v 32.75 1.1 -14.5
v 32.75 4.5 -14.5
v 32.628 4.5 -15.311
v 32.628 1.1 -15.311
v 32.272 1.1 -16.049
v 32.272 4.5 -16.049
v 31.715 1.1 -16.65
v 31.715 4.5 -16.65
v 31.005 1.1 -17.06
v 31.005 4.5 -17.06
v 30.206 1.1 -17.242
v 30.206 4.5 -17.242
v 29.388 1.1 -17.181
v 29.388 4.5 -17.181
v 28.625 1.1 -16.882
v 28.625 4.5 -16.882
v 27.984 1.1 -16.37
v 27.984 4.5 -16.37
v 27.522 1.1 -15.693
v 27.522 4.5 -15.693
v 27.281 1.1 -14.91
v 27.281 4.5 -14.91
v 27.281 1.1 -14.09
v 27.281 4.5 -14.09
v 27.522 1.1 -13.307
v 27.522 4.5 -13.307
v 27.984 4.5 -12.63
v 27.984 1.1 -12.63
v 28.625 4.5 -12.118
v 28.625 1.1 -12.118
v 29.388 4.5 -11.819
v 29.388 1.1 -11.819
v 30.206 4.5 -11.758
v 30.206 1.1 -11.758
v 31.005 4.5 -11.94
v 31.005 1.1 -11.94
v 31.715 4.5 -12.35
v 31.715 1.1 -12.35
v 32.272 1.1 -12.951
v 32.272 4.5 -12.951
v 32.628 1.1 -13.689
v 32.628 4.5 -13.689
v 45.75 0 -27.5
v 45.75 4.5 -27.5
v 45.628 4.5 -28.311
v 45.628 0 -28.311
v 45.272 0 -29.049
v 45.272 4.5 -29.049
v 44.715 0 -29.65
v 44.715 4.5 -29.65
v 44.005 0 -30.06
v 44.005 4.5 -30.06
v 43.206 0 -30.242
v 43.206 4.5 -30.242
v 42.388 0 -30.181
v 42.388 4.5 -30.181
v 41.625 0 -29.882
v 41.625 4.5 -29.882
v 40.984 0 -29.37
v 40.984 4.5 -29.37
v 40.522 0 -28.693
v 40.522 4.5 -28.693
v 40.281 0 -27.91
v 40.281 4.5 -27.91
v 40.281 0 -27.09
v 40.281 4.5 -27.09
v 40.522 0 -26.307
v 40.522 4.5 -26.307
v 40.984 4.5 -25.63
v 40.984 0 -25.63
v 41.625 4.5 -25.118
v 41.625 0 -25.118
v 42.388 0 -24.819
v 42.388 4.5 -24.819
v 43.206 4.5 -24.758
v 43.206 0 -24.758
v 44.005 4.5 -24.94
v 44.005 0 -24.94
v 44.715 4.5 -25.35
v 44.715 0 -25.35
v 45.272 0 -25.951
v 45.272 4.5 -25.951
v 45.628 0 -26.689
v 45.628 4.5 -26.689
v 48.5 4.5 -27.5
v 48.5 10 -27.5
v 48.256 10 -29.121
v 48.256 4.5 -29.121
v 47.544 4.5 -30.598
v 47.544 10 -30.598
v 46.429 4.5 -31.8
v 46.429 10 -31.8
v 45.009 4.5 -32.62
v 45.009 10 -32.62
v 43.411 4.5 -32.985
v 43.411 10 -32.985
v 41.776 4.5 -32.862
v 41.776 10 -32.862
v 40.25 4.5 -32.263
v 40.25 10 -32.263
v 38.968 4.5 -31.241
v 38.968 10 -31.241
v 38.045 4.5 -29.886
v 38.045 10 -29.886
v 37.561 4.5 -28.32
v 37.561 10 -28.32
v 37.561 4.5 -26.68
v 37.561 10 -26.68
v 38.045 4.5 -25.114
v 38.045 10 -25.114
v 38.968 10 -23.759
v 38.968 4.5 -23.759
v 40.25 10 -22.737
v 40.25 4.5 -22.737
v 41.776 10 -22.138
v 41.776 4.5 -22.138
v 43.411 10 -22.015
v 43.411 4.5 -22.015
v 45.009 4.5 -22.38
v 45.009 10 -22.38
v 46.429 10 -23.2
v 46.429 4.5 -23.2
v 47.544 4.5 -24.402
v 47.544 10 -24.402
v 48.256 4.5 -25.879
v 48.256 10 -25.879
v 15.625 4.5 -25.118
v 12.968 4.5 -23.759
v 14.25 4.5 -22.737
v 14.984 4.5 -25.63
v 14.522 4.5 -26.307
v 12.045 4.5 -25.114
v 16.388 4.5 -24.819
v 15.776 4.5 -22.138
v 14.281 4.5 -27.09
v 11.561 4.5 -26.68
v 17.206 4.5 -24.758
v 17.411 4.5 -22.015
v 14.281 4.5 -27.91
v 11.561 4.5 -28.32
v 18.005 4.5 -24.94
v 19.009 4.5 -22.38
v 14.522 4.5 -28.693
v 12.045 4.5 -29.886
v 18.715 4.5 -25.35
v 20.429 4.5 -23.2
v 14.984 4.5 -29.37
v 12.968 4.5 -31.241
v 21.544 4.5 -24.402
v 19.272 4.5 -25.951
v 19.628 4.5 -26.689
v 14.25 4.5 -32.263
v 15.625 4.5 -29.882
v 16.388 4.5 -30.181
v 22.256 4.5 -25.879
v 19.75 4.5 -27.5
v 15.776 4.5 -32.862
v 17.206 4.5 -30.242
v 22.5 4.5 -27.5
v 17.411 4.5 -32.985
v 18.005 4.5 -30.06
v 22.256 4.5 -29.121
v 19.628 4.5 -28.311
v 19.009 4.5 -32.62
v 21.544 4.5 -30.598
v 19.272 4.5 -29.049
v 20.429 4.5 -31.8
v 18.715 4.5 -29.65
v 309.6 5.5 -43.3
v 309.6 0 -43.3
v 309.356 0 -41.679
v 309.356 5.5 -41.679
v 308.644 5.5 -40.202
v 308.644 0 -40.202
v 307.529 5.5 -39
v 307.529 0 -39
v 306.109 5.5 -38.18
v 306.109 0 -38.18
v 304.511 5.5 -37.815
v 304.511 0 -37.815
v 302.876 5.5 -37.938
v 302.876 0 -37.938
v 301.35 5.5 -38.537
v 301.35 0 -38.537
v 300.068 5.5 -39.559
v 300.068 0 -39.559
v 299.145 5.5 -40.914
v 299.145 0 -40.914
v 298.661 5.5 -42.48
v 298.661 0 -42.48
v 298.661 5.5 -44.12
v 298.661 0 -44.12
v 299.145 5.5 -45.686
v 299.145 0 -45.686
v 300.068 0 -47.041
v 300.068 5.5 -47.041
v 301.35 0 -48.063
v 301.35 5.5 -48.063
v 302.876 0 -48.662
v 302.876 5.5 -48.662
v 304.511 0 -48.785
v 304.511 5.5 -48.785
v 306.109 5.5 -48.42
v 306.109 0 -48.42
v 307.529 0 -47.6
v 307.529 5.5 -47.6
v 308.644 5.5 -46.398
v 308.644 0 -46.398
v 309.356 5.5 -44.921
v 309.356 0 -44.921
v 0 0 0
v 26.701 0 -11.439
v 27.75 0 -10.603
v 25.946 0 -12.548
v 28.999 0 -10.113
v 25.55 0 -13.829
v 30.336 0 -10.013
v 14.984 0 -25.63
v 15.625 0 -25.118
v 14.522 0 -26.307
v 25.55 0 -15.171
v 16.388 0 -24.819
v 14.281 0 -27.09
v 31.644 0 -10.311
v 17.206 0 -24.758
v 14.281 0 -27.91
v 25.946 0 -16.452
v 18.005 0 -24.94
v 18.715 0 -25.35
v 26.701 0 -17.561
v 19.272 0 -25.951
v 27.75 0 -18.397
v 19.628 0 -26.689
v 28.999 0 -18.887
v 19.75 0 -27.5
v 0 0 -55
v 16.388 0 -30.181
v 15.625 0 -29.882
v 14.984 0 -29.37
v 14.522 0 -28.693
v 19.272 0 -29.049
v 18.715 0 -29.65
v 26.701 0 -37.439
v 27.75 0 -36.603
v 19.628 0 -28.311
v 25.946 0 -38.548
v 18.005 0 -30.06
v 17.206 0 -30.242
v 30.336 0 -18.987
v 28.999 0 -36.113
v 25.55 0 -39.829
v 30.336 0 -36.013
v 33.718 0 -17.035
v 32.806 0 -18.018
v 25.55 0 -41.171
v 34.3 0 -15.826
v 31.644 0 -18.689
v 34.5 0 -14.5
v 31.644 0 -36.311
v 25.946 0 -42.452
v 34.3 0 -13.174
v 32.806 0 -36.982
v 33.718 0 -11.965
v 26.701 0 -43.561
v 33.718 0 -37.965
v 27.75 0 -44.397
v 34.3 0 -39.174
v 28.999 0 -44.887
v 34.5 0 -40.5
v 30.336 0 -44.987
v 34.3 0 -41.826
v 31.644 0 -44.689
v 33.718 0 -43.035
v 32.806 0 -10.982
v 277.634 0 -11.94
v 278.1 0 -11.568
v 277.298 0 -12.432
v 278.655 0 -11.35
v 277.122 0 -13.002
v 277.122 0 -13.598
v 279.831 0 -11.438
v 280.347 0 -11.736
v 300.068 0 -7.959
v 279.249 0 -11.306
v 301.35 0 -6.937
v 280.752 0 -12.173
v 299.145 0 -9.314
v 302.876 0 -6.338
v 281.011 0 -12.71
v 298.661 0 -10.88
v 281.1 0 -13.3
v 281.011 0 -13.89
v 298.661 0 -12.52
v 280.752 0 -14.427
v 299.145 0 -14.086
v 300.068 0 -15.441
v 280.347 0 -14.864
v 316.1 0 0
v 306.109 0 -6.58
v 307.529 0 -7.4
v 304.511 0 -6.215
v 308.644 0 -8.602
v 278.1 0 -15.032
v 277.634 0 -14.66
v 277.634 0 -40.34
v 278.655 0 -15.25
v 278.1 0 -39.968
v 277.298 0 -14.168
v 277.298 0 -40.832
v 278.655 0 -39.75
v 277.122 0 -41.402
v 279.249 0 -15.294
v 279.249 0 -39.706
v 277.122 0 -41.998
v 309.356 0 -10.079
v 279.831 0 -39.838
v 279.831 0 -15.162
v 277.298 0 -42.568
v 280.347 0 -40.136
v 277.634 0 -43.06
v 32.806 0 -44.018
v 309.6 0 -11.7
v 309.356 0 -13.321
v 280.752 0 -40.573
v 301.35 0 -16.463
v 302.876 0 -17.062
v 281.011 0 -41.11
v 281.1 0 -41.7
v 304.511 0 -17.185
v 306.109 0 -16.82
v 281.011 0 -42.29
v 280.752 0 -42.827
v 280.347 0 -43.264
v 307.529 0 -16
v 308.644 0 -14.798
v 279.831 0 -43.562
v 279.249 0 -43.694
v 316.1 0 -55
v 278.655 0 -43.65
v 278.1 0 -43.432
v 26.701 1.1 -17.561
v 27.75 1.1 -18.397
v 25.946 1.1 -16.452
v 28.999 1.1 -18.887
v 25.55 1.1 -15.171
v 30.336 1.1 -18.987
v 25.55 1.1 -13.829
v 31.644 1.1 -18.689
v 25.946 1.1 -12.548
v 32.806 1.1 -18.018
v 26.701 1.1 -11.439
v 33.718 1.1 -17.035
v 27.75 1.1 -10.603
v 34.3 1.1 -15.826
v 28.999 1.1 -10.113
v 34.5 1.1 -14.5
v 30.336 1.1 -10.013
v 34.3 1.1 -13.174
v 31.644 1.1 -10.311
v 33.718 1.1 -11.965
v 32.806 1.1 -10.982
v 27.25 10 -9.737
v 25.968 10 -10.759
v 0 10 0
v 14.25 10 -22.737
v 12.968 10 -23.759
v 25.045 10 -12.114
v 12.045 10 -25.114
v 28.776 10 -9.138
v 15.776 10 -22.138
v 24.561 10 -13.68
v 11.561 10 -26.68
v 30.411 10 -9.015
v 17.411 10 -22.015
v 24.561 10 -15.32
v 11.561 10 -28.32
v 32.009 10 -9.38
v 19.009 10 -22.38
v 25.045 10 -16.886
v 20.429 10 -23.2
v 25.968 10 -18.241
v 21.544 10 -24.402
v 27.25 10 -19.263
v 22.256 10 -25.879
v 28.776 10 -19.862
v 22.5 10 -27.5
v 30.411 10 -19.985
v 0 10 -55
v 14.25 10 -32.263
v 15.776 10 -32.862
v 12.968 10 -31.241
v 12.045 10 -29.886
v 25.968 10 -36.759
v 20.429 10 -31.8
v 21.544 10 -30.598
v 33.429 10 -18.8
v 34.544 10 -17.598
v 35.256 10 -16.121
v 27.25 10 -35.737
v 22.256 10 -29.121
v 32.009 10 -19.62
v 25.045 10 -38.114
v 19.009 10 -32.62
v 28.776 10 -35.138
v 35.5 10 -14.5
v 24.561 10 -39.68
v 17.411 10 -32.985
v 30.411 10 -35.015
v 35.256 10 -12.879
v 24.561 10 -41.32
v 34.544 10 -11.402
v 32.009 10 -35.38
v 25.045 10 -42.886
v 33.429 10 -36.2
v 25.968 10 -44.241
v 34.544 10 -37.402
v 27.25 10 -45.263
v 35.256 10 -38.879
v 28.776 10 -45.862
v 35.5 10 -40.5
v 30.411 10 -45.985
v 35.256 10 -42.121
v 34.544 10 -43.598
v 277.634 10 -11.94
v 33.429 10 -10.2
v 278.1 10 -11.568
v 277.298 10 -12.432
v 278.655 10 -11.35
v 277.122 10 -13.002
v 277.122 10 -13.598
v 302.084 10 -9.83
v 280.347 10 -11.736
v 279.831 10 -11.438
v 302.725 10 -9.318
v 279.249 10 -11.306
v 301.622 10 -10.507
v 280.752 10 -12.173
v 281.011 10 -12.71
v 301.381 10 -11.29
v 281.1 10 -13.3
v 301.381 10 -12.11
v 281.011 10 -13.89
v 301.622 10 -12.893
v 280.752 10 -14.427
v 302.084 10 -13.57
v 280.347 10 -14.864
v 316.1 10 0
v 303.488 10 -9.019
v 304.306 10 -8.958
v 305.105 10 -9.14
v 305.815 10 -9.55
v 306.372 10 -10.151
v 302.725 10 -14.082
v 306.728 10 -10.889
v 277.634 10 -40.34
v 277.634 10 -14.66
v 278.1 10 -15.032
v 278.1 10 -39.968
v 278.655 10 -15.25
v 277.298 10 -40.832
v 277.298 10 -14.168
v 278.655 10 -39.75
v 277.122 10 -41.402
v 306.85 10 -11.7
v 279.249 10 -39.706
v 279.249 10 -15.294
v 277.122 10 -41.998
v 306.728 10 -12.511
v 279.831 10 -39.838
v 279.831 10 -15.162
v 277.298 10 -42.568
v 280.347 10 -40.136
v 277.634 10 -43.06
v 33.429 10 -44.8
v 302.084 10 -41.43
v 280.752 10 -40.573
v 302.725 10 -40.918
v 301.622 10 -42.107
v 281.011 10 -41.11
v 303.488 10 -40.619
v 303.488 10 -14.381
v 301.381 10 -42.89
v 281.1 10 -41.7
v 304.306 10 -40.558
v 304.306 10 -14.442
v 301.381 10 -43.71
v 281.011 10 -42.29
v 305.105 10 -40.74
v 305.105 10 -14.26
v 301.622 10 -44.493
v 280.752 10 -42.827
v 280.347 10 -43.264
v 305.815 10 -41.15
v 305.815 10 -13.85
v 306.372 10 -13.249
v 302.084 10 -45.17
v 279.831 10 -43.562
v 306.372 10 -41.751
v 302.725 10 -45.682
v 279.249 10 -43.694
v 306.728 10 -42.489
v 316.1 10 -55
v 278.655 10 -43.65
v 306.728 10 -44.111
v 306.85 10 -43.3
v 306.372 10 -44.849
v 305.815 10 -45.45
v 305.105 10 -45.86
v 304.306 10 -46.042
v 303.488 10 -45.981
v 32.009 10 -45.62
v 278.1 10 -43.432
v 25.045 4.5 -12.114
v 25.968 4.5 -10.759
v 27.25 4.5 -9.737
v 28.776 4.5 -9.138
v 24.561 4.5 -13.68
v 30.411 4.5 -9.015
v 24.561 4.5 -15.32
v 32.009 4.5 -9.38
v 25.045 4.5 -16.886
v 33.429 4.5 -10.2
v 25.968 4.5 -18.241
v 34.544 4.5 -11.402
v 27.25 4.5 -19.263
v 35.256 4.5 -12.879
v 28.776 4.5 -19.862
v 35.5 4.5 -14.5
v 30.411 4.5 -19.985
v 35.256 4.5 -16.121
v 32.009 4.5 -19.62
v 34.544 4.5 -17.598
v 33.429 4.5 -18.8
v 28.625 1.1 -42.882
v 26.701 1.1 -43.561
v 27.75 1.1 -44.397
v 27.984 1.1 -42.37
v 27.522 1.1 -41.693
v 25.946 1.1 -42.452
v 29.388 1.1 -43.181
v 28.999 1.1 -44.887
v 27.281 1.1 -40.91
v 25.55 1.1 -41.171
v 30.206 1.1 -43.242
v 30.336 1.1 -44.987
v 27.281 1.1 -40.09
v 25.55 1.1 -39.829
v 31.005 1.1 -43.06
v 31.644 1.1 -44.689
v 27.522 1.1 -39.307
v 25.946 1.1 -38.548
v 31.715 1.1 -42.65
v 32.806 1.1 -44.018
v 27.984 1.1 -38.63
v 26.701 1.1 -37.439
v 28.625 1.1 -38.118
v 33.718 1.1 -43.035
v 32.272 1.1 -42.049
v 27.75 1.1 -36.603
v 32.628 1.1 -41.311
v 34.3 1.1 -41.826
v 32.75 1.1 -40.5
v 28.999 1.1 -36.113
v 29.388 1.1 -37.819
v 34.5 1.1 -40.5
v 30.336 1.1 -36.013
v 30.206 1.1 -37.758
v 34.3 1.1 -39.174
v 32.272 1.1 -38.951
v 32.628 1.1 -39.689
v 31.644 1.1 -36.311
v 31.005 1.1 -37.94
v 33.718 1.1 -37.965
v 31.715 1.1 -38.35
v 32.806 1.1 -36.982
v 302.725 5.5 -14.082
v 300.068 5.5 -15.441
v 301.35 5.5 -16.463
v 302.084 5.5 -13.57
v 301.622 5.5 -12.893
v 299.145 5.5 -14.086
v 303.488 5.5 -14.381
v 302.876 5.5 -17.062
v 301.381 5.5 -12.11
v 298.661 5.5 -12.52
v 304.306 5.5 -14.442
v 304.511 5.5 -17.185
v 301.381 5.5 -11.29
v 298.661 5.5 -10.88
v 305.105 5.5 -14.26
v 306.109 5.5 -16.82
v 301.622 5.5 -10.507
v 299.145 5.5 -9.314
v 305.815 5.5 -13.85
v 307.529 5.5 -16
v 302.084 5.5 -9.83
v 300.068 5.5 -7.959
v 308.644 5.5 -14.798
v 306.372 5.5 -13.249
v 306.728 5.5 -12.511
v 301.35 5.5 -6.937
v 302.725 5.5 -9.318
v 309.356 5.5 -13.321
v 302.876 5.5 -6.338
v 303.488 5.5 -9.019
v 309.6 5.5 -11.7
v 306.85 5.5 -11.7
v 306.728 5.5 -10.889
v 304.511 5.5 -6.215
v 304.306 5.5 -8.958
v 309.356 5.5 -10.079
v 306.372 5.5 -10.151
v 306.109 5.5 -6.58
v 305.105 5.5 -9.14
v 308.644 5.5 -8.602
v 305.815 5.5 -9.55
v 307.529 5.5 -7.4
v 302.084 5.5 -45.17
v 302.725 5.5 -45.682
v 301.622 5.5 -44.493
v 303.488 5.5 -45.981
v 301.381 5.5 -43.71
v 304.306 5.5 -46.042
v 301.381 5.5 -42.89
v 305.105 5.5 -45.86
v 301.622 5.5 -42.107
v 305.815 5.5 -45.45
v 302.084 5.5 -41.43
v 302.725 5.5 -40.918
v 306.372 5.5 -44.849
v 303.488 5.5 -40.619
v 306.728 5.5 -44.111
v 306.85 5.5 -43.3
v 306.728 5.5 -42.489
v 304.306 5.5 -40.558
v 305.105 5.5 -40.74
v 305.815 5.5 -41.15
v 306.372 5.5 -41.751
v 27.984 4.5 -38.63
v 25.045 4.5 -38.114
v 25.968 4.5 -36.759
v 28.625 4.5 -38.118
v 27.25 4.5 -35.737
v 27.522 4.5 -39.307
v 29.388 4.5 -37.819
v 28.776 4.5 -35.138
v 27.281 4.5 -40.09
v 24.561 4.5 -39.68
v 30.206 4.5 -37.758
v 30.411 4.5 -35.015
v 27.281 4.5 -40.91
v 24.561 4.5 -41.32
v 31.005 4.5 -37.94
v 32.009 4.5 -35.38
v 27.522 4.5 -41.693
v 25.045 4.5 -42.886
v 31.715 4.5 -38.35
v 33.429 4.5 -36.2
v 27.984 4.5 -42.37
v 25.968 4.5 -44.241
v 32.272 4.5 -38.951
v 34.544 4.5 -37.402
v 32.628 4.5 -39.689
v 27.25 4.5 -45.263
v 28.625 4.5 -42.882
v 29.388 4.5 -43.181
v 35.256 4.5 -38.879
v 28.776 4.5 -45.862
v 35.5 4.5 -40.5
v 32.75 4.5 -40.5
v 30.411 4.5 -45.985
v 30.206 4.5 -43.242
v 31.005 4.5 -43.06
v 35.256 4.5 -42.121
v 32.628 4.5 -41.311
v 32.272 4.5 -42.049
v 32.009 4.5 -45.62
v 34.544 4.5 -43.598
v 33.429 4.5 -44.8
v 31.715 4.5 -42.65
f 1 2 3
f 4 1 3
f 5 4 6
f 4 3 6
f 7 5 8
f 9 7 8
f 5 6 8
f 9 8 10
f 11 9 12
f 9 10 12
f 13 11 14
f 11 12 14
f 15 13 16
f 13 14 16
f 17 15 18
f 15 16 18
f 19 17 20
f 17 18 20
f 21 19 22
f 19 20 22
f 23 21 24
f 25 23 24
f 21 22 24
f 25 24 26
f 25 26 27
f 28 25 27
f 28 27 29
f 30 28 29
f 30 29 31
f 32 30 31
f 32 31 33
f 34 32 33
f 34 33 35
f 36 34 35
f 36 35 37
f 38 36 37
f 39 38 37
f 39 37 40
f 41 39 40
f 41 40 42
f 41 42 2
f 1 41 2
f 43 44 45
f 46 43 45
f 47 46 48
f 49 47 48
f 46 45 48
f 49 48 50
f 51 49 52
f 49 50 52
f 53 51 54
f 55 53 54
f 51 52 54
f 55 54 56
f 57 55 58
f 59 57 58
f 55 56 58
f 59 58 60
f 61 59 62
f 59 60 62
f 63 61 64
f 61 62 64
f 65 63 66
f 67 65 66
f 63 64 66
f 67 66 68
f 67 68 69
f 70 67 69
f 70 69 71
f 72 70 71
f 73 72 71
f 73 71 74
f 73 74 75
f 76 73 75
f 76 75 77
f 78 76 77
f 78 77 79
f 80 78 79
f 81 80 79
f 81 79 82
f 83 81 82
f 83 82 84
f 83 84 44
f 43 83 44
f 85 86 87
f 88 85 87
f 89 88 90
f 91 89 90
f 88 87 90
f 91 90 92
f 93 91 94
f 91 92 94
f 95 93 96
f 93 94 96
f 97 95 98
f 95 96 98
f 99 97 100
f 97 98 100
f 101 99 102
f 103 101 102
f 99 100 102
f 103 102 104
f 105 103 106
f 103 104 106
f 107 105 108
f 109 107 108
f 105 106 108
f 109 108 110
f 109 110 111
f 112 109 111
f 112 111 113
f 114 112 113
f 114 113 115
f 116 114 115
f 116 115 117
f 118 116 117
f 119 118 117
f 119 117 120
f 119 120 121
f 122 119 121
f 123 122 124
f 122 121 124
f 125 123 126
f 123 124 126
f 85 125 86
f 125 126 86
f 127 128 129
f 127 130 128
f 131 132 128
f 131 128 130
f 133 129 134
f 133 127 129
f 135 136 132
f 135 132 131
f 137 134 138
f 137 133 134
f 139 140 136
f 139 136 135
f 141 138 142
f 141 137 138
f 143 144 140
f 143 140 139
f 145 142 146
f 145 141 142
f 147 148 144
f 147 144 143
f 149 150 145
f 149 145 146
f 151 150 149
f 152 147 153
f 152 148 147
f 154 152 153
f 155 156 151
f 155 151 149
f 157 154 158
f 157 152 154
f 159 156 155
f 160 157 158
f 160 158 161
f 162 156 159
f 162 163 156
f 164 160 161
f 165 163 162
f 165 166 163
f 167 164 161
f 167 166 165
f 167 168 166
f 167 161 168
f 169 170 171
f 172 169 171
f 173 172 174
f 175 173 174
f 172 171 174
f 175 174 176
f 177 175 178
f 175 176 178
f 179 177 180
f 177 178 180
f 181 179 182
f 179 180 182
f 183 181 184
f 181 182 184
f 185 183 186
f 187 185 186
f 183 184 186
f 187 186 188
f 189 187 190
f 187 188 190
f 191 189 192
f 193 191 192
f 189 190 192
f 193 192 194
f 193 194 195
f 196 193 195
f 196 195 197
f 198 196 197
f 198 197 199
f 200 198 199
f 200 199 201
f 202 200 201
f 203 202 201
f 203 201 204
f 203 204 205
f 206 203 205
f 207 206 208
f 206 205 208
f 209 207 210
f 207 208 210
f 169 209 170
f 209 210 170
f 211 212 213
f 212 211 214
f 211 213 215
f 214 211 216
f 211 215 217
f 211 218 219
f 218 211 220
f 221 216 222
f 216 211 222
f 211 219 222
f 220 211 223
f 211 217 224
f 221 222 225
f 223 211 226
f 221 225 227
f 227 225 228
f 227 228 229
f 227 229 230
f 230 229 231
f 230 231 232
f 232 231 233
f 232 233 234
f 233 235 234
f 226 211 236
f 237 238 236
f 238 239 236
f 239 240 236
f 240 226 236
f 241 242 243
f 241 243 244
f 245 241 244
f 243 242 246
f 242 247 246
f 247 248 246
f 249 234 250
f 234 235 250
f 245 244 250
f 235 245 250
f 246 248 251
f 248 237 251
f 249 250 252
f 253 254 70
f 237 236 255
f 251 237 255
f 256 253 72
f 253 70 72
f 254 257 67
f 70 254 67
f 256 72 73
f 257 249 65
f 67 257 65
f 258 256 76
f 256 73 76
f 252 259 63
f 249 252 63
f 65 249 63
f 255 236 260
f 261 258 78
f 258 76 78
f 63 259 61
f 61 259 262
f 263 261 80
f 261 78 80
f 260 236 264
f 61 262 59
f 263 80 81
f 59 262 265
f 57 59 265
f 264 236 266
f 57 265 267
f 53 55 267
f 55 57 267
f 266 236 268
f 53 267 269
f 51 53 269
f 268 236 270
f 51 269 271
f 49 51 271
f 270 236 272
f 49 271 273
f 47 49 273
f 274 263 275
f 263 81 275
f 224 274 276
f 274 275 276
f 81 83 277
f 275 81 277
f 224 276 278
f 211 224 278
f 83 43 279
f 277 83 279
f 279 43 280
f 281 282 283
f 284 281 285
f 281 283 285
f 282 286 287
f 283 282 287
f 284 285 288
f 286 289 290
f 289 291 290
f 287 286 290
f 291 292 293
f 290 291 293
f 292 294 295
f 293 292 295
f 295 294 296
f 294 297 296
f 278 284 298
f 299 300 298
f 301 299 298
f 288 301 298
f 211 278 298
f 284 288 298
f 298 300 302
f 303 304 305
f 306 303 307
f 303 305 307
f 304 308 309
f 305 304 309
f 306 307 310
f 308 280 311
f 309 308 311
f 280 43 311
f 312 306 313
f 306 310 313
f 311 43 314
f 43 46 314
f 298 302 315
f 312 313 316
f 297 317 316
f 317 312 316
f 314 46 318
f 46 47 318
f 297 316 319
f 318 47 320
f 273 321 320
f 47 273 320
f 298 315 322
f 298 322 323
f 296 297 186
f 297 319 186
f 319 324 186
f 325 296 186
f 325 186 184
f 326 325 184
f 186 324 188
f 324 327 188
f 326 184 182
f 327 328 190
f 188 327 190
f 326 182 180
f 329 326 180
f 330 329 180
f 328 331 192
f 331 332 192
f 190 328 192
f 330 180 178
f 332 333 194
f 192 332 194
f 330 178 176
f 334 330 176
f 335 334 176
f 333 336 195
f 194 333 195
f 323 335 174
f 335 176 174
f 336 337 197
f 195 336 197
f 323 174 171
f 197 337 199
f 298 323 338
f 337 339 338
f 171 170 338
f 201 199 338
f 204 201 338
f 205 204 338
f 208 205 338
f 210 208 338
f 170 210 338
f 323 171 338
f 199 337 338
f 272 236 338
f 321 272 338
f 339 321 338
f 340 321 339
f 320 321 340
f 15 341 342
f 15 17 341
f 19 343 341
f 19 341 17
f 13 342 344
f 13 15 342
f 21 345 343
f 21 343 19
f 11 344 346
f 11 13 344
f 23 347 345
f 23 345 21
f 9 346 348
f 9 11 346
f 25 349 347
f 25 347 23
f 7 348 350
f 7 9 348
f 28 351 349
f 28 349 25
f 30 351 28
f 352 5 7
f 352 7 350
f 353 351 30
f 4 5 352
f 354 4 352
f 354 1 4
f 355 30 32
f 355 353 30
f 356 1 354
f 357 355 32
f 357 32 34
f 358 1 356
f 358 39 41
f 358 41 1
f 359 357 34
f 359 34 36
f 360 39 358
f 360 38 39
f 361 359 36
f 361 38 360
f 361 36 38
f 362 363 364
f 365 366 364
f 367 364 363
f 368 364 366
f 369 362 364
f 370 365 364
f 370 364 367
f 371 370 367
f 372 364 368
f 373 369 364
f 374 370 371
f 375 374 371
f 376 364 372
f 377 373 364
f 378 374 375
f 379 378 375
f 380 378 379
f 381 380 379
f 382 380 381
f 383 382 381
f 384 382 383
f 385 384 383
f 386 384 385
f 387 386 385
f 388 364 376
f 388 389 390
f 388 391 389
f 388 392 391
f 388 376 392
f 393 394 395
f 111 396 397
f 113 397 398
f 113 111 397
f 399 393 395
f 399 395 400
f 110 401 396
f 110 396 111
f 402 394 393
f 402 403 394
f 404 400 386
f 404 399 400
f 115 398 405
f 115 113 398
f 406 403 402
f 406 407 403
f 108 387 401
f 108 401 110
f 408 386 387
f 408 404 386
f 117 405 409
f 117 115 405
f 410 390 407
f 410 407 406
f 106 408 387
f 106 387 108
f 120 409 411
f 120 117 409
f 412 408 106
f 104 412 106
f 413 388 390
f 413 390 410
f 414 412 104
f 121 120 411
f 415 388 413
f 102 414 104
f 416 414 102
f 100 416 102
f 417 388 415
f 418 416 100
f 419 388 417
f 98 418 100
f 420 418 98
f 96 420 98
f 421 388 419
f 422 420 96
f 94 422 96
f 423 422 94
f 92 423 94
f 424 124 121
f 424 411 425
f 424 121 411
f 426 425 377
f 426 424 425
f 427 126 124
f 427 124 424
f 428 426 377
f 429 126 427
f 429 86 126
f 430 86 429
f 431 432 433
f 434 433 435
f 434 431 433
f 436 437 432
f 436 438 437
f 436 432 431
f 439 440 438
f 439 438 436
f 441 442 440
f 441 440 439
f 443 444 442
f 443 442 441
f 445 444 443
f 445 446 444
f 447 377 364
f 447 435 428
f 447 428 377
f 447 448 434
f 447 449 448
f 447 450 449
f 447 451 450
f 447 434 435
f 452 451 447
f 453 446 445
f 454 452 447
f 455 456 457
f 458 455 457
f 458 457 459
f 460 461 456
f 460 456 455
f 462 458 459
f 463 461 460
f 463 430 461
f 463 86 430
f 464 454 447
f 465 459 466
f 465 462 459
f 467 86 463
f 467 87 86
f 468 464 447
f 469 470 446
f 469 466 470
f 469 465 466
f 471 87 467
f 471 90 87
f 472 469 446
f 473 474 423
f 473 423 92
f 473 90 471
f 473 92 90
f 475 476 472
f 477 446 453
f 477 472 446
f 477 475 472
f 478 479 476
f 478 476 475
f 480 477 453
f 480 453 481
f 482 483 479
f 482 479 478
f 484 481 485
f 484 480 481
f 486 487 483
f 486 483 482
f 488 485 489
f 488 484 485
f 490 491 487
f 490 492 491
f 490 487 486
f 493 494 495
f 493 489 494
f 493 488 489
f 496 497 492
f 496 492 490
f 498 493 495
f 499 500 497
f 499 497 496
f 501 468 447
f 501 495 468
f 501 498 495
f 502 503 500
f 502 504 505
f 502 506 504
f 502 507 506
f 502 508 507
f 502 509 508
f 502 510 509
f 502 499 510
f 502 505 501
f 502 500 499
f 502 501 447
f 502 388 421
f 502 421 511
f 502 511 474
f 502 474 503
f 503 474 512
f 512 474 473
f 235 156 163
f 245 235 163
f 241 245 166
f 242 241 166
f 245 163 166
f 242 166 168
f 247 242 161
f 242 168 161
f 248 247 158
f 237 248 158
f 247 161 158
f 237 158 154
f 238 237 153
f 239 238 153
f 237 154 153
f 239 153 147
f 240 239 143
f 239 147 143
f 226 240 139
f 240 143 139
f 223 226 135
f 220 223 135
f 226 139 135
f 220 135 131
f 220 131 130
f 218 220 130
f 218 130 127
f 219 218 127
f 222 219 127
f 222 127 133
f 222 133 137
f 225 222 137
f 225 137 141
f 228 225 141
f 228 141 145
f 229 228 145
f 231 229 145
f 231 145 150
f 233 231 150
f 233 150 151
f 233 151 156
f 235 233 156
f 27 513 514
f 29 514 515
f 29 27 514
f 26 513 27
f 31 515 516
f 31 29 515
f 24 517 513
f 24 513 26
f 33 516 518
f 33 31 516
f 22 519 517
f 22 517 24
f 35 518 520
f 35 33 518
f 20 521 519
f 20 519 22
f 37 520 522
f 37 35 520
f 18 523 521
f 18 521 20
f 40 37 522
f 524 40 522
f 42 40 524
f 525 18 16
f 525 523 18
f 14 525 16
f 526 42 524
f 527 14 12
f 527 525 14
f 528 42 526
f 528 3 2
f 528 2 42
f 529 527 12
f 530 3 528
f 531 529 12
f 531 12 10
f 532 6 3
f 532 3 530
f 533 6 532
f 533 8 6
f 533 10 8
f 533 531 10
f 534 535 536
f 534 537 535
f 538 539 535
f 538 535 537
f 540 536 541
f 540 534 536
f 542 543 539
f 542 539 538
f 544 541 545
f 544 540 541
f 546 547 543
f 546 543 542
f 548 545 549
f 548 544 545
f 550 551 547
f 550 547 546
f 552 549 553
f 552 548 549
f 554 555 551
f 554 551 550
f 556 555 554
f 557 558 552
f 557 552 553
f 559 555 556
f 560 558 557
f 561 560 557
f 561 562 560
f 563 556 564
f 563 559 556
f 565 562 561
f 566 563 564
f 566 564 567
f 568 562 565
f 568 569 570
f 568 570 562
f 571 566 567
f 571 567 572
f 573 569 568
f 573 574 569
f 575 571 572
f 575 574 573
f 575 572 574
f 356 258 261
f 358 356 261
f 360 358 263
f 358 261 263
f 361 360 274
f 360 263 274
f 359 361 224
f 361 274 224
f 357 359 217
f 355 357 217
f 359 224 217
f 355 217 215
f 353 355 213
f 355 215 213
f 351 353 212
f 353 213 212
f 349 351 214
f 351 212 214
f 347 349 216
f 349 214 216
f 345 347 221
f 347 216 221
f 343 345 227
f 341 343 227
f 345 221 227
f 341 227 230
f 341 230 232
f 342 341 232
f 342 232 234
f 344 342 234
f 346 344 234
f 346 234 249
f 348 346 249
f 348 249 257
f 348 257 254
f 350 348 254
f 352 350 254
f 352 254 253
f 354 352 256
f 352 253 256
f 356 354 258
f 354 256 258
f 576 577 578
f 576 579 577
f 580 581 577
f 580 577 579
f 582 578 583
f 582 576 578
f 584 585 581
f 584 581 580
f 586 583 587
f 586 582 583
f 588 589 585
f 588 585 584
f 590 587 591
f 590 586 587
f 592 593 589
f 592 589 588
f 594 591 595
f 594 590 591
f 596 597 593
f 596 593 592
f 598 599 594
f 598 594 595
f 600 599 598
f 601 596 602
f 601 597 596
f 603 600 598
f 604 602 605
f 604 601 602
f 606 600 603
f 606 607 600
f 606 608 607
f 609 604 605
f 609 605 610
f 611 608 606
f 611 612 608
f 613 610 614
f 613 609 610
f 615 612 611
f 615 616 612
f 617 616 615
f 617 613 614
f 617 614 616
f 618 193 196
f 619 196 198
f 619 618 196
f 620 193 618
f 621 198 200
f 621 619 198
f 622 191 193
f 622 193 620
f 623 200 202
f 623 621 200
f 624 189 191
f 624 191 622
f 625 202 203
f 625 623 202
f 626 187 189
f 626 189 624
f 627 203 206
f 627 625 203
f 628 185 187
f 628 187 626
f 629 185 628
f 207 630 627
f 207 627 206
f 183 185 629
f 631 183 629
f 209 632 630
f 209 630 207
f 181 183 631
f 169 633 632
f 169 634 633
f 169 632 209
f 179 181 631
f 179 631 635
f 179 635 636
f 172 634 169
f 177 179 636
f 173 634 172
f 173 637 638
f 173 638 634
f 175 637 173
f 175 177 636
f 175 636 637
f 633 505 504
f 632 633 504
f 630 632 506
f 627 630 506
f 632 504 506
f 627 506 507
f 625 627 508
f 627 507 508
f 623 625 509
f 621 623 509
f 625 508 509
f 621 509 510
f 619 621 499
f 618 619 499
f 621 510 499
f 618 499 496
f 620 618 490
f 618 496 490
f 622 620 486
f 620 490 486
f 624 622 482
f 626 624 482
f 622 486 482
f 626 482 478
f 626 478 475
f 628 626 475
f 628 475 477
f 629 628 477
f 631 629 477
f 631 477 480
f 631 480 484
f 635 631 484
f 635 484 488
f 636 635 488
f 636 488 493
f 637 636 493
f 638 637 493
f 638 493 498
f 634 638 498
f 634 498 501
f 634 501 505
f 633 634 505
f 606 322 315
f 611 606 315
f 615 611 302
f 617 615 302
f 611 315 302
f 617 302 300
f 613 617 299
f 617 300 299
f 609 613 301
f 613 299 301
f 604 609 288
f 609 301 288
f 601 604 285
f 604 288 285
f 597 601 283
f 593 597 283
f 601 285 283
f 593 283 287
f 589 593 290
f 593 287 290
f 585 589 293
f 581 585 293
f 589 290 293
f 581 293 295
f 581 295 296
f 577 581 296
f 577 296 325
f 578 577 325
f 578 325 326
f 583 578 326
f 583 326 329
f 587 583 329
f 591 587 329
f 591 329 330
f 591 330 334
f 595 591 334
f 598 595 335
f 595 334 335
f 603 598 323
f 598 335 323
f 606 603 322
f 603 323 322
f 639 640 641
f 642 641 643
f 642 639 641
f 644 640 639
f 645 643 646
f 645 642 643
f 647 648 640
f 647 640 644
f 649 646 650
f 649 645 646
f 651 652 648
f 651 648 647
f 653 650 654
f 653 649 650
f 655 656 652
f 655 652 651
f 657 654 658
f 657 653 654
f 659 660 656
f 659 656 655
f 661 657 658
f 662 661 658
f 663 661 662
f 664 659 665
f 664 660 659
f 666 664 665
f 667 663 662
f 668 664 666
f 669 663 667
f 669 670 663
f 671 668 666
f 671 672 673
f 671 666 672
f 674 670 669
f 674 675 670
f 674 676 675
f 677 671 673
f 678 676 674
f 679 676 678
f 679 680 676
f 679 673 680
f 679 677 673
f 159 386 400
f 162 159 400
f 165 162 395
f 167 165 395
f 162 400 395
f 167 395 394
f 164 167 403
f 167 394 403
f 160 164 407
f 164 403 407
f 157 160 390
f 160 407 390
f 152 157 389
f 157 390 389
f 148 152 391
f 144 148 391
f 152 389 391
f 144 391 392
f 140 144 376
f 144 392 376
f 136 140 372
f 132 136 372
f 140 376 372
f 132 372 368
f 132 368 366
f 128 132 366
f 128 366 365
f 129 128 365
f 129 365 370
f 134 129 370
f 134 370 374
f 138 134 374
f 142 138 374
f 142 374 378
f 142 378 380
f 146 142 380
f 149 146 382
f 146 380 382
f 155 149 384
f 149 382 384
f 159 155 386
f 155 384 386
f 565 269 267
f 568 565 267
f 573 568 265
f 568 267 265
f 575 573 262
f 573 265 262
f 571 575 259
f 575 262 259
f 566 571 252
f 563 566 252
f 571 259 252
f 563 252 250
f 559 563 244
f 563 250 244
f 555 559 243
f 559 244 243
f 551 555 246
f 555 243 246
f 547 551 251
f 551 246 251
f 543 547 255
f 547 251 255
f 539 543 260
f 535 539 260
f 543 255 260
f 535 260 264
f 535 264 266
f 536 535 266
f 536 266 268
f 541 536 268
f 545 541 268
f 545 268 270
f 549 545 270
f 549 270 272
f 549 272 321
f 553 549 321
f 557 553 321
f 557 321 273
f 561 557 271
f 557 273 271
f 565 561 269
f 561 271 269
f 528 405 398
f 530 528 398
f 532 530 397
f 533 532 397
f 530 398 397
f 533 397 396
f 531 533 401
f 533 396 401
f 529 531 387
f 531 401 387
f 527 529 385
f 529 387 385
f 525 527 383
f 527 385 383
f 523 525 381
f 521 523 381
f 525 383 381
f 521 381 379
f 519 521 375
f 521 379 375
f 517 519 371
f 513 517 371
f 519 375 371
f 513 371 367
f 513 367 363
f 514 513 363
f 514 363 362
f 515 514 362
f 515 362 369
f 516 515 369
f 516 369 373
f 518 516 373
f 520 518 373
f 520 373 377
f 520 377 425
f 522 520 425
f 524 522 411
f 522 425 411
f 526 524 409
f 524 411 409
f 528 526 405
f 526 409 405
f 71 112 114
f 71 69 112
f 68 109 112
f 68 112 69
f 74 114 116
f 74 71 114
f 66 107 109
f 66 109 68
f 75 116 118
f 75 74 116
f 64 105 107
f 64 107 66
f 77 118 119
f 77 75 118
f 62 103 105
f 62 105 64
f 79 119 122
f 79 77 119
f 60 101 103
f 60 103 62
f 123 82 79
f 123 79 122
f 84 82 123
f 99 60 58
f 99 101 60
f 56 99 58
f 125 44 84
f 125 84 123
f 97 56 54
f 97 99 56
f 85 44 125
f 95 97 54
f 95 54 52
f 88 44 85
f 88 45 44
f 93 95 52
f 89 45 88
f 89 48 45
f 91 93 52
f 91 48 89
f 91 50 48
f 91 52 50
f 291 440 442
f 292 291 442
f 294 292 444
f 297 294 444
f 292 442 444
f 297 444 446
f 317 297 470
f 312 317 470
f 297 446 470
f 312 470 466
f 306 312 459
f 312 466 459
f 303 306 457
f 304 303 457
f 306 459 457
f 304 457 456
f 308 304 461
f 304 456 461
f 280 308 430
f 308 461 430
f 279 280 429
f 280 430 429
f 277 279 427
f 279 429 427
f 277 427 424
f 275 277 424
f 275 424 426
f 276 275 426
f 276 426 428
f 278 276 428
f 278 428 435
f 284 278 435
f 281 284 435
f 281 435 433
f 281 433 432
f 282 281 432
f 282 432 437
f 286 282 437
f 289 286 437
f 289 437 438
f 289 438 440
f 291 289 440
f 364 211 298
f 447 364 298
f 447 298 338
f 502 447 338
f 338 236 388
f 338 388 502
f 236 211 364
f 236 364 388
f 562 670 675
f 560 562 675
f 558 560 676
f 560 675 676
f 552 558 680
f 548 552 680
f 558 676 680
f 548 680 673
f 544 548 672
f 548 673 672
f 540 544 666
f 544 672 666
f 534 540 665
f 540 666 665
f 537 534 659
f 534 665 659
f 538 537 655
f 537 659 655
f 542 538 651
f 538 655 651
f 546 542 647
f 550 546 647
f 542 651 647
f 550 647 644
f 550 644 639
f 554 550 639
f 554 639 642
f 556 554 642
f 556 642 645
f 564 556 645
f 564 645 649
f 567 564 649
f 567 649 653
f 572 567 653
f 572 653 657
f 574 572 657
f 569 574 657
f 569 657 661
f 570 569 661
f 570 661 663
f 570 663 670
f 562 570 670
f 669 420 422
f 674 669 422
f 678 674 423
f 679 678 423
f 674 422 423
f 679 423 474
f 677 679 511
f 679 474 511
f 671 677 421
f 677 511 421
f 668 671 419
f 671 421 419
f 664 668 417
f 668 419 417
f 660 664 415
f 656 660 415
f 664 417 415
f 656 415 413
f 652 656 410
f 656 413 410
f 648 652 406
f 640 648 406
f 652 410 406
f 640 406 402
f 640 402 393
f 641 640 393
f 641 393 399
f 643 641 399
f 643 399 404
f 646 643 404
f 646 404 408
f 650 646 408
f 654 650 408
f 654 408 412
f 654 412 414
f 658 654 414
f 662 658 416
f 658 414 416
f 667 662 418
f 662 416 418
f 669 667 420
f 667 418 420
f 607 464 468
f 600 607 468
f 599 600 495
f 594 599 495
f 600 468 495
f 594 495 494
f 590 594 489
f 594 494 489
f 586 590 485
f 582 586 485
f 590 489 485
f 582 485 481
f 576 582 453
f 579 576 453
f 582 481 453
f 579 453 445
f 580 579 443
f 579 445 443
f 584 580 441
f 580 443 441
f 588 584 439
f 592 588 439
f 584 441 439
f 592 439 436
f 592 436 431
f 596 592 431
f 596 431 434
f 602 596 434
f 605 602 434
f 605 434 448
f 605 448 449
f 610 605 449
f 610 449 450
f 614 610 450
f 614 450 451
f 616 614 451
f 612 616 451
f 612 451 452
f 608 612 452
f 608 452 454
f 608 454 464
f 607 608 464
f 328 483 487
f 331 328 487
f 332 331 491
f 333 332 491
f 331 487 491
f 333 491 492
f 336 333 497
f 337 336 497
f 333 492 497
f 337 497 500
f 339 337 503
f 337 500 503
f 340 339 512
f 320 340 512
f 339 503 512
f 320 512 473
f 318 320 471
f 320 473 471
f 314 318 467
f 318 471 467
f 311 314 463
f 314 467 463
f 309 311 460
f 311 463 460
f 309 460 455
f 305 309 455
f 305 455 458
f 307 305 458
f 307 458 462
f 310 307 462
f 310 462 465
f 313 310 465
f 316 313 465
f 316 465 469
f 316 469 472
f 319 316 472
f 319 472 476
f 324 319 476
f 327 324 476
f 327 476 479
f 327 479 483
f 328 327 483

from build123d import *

# Parameters (mm, degrees)
SKETCH1_W           = 316.1
SKETCH1_H           = 55
BOSS_EXTRUDE1_DEPTH = 10
SKETCH2_R           = 2
SKETCH2_R_2         = 2.75
CUT_EXTRUDE1_DEPTH  = 11
SKETCH3_R           = 5.5
CUT_EXTRUDE2_DEPTH  = 5.5
SKETCH4_R           = 2.75
CUT_EXTRUDE3_DEPTH  = 11
SKETCH6_R           = 4.5
CUT_EXTRUDE4_DEPTH  = 1.1
SKETCH7_R           = 5.5
CUT_EXTRUDE5_DEPTH  = 5.5


with BuildPart() as part:
    # Sketch1 → Boss-Extrude1 (new body)
    with BuildSketch(Plane(origin=(0, 0, 0), x_dir=(1, 0, 0), z_dir=(0, 1, 0))):
        with Locations((158.05, 27.5)):
            Rectangle(SKETCH1_W, SKETCH1_H)
    extrude(amount=BOSS_EXTRUDE1_DEPTH)

    # Sketch2 → Cut-Extrude1 (cut, through all)
    with BuildSketch(Plane(origin=(0, 10, 0), x_dir=(1, 0, 0), z_dir=(0, 1, 0))):
        with Locations((279.1, 13.3)):
            Circle(SKETCH2_R)
        with Locations((279.1, 41.7)):
            Circle(SKETCH2_R)
        with Locations((304.1, 43.3)):
            Circle(SKETCH2_R_2)
        with Locations((304.1, 11.7)):
            Circle(SKETCH2_R_2)
    extrude(amount=-CUT_EXTRUDE1_DEPTH, mode=Mode.SUBTRACT)

    # Sketch3 → Cut-Extrude2 (cut)
    with BuildSketch(Plane.XZ):
        with Locations((304.1, -11.7)):
            Circle(SKETCH3_R)
        with Locations((304.1, -43.3)):
            Circle(SKETCH3_R)
    extrude(amount=-CUT_EXTRUDE2_DEPTH, mode=Mode.SUBTRACT)

    # Sketch4 → Cut-Extrude3 (cut, through all)
    with BuildSketch(Plane(origin=(0, 10, 0), x_dir=(1, 0, 0), z_dir=(0, 1, 0))):
        with Locations((17, 27.5)):
            Circle(SKETCH4_R)
        with Locations((30, 40.5)):
            Circle(SKETCH4_R)
        with Locations((43, 27.5)):
            Circle(SKETCH4_R)
        with Locations((30, 14.5)):
            Circle(SKETCH4_R)
    extrude(amount=-CUT_EXTRUDE3_DEPTH, mode=Mode.SUBTRACT)

    # Sketch6 → Cut-Extrude4 (cut)
    with BuildSketch(Plane.XZ):
        with Locations((30, -14.5)):
            Circle(SKETCH6_R)
        with Locations((30, -40.5)):
            Circle(SKETCH6_R)
    extrude(amount=-CUT_EXTRUDE4_DEPTH, mode=Mode.SUBTRACT)

    # Sketch7 → Cut-Extrude5 (cut)
    with BuildSketch(Plane(origin=(0, 10, 0), x_dir=(1, 0, 0), z_dir=(0, 1, 0))):
        with Locations((17, 27.5)):
            Circle(SKETCH7_R)
        with Locations((30, 40.5)):
            Circle(SKETCH7_R)
        with Locations((43, 27.5)):
            Circle(SKETCH7_R)
        with Locations((30, 14.5)):
            Circle(SKETCH7_R)
    extrude(amount=-CUT_EXTRUDE5_DEPTH, mode=Mode.SUBTRACT)


solid = part.part
